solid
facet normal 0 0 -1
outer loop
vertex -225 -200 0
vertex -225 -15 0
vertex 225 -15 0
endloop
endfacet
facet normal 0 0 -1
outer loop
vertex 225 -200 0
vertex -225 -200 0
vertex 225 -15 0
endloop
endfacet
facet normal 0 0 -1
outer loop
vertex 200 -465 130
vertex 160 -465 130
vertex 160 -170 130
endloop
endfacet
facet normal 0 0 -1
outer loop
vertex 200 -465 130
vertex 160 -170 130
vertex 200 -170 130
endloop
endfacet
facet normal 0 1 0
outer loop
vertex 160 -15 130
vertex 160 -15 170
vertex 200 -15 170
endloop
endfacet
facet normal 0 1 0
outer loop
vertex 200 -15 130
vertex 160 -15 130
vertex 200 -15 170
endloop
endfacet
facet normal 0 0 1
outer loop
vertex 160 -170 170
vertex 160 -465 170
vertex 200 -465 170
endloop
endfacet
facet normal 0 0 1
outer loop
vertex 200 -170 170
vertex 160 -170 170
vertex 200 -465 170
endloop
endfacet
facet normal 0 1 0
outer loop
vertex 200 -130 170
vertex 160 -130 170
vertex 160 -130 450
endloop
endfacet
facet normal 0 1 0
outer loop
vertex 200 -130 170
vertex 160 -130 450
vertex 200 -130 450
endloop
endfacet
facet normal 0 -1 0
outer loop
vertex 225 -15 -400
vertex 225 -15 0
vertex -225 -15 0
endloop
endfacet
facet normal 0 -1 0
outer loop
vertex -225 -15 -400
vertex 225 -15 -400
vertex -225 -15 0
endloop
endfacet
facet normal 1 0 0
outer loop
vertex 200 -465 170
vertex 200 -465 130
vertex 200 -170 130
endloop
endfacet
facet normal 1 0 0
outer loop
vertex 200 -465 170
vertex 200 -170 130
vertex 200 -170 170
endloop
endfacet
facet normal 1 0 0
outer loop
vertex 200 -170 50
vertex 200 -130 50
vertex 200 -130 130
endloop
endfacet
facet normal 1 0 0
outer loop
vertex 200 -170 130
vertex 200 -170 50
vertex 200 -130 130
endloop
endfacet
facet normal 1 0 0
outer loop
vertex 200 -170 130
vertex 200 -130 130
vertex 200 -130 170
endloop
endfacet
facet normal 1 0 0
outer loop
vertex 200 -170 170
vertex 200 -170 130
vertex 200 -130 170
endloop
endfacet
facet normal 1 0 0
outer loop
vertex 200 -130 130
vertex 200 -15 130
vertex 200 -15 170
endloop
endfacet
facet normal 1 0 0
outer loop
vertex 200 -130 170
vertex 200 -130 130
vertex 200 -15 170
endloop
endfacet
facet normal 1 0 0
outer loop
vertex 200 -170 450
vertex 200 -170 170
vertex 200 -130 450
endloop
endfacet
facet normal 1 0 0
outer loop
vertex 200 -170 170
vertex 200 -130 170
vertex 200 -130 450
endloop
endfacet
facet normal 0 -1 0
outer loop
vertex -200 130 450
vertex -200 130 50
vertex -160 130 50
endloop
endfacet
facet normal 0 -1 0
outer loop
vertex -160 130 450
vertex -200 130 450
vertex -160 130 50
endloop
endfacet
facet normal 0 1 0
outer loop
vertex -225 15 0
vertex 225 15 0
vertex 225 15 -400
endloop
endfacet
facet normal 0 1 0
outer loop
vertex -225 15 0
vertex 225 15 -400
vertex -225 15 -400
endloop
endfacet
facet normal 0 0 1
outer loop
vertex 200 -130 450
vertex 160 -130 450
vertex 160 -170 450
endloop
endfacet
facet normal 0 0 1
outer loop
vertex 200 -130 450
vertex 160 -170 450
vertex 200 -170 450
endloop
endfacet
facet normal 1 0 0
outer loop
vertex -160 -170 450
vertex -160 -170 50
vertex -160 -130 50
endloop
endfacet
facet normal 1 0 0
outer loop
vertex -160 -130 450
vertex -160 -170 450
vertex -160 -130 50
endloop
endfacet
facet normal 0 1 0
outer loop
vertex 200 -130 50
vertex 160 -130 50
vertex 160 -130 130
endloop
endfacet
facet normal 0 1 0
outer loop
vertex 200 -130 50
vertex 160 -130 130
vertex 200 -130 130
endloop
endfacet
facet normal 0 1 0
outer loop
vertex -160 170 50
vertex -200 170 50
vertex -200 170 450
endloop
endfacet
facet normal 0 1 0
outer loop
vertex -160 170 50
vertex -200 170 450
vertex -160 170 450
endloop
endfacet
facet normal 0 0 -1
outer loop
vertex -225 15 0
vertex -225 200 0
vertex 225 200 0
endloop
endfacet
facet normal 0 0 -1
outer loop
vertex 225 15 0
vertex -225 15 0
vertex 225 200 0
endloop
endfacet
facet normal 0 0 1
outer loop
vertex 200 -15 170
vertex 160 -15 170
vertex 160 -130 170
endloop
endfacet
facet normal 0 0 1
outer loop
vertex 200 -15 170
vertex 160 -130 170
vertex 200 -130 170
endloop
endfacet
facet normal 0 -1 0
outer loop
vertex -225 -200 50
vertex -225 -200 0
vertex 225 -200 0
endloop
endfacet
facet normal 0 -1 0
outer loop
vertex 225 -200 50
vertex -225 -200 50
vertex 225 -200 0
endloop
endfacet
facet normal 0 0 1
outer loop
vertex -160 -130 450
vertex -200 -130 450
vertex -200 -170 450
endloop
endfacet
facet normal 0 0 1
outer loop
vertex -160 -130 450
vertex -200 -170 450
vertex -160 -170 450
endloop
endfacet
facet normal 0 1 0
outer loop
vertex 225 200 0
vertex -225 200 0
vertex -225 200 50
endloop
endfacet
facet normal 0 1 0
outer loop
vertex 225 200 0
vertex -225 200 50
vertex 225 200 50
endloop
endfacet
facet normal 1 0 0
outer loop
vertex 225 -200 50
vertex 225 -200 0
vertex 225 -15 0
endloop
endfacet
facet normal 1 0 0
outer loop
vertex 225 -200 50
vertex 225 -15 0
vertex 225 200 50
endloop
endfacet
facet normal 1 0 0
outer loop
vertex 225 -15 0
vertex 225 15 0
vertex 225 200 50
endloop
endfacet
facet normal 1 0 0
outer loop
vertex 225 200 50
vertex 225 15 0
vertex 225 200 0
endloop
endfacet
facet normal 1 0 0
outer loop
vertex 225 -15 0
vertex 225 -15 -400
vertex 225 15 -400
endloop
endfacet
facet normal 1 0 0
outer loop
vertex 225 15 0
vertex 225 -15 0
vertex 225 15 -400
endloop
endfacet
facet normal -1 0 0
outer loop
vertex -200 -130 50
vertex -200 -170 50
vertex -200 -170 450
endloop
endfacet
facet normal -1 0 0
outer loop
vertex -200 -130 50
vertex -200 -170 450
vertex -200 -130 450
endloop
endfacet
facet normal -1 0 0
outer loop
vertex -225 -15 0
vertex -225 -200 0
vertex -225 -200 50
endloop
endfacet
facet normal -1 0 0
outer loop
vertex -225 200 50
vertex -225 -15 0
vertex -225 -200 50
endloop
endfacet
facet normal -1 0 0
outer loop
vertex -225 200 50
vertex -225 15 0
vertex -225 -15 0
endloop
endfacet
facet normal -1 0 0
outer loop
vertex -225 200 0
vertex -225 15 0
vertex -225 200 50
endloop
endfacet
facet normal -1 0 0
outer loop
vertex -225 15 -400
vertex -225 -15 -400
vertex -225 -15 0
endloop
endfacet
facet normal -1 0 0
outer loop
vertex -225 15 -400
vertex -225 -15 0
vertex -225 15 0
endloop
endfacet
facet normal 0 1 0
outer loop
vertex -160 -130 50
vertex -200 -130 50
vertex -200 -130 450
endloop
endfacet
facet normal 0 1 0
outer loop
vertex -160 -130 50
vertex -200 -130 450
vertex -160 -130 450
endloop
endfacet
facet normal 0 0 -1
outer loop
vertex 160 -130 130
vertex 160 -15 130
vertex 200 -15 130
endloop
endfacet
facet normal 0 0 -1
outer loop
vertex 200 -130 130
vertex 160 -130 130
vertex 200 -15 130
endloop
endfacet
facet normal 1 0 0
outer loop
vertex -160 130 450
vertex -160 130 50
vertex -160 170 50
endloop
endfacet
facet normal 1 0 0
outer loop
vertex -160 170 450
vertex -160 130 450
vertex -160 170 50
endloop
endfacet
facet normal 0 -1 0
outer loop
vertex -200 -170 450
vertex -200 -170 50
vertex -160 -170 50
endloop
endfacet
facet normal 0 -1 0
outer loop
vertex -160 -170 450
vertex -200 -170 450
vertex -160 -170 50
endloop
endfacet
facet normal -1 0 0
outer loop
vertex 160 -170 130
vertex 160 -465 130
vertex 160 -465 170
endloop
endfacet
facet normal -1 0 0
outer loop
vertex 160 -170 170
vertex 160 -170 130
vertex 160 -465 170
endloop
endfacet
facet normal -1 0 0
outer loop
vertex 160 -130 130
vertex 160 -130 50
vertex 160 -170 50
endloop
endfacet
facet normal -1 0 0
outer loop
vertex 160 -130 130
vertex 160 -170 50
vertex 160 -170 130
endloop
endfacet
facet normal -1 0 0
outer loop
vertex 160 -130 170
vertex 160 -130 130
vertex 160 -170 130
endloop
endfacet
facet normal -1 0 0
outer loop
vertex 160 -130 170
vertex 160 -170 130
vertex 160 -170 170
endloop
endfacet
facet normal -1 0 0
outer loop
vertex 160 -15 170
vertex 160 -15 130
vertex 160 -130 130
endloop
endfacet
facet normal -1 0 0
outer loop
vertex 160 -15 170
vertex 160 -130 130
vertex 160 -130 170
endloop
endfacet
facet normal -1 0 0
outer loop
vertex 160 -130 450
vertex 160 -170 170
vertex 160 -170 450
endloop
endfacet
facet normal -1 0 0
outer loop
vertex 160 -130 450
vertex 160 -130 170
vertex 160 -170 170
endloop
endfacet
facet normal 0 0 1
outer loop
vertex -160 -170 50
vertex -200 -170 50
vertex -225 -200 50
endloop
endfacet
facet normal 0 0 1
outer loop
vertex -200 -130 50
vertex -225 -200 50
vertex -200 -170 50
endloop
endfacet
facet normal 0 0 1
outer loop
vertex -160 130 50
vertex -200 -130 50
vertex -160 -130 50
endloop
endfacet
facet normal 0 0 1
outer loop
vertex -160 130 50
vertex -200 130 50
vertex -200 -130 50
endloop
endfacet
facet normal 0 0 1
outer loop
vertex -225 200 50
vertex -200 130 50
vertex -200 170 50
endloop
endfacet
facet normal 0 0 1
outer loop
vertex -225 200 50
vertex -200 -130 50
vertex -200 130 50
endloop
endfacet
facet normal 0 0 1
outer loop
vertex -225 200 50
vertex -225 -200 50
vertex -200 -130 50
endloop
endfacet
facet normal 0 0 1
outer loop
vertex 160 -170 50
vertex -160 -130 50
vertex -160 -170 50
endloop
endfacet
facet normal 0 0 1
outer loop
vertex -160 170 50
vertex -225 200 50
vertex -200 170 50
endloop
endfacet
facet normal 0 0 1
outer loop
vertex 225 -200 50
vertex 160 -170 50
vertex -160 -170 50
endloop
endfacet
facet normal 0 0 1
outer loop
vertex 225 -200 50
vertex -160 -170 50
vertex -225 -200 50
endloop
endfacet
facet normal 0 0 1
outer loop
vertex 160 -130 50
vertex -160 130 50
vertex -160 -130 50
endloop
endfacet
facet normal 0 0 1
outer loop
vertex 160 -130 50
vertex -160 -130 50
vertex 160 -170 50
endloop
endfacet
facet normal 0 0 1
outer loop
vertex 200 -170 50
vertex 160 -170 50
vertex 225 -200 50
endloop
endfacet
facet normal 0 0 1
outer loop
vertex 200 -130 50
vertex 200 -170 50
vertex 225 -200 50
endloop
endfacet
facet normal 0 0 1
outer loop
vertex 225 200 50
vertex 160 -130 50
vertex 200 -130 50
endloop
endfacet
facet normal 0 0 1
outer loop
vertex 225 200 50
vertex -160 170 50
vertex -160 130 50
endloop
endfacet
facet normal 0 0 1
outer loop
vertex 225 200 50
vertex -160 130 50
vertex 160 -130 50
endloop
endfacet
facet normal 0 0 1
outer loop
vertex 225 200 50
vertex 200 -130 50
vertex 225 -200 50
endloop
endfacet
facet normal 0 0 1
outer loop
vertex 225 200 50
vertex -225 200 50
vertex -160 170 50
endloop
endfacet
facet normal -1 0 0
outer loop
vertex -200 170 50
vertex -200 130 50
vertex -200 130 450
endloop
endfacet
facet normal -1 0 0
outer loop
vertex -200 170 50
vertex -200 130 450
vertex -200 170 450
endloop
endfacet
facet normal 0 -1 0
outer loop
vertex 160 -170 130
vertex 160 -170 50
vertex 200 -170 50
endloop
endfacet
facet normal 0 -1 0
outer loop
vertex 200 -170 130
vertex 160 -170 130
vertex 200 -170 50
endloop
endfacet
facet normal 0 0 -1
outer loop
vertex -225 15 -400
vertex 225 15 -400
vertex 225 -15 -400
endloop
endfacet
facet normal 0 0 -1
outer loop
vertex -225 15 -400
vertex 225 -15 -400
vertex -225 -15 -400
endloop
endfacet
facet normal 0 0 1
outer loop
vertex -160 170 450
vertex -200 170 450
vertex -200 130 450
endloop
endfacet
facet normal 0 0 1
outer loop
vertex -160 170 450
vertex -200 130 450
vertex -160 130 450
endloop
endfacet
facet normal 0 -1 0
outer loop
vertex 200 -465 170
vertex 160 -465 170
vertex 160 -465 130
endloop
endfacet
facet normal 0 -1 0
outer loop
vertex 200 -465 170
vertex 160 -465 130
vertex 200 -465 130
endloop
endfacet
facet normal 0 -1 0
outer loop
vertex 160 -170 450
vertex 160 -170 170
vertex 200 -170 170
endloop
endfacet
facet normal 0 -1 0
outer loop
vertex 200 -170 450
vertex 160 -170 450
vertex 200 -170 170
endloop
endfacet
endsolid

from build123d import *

# Parameters (mm, degrees)
SKETCH_1_W      = 450
SKETCH_1_H      = 400
EXTRUDE_1_DEPTH = 50
SKETCH_2_W      = 450
SKETCH_2_H      = 30
EXTRUDE_2_DEPTH = 400
SKETCH_3_W      = 40
SKETCH_3_H      = 40
EXTRUDE_3_DEPTH = 450
SKETCH_4_W      = 40
SKETCH_4_H      = 40
EXTRUDE_4_DEPTH = 450
SKETCH_5_W      = 40
SKETCH_5_H      = 40
EXTRUDE_5_DEPTH = 450
SKETCH_6_W      = 40
SKETCH_6_H      = 40
EXTRUDE_6_DEPTH = 450


with BuildPart() as part:
    # 草图1 → 凸台-拉伸1 (new body)
    with BuildSketch(Plane.XY):
        Rectangle(SKETCH_1_W, SKETCH_1_H)
    extrude(amount=EXTRUDE_1_DEPTH)

    # 草图2 → 凸台-拉伸2 (add)
    with BuildSketch(Plane(origin=(0, 0, 0), x_dir=(-1, 0, 0), z_dir=(0, 0, -1))):
        Rectangle(SKETCH_2_W, SKETCH_2_H)
    extrude(amount=EXTRUDE_2_DEPTH)

    # 草图4 → 凸台-拉伸4 (add)
    with BuildSketch(Plane.XY):
        with Locations((-180, 150)):
            Rectangle(SKETCH_4_W, SKETCH_4_H)
    extrude(amount=EXTRUDE_4_DEPTH)



with BuildPart() as body_2:
    # 草图3 → 凸台-拉伸3 (new body)
    with BuildSketch(Plane.XZ.offset(15)):
        with Locations((180, 150)):
            Rectangle(SKETCH_3_W, SKETCH_3_H)
    extrude(amount=EXTRUDE_3_DEPTH)


with BuildPart() as part_1:
    add(part.part)

    add(body_2.part)  # 凸台-拉伸5 merges body 2
    # 草图5 → 凸台-拉伸5 (add)
    with BuildSketch(Plane.XY):
        with Locations((180, -150)):
            Rectangle(SKETCH_5_W, SKETCH_5_H)
    extrude(amount=EXTRUDE_5_DEPTH)

    # 草图6 → 凸台-拉伸6 (add)
    with BuildSketch(Plane.XY):
        with Locations((-180, -150)):
            Rectangle(SKETCH_6_W, SKETCH_6_H)
    extrude(amount=EXTRUDE_6_DEPTH)


solid = part_1.part
